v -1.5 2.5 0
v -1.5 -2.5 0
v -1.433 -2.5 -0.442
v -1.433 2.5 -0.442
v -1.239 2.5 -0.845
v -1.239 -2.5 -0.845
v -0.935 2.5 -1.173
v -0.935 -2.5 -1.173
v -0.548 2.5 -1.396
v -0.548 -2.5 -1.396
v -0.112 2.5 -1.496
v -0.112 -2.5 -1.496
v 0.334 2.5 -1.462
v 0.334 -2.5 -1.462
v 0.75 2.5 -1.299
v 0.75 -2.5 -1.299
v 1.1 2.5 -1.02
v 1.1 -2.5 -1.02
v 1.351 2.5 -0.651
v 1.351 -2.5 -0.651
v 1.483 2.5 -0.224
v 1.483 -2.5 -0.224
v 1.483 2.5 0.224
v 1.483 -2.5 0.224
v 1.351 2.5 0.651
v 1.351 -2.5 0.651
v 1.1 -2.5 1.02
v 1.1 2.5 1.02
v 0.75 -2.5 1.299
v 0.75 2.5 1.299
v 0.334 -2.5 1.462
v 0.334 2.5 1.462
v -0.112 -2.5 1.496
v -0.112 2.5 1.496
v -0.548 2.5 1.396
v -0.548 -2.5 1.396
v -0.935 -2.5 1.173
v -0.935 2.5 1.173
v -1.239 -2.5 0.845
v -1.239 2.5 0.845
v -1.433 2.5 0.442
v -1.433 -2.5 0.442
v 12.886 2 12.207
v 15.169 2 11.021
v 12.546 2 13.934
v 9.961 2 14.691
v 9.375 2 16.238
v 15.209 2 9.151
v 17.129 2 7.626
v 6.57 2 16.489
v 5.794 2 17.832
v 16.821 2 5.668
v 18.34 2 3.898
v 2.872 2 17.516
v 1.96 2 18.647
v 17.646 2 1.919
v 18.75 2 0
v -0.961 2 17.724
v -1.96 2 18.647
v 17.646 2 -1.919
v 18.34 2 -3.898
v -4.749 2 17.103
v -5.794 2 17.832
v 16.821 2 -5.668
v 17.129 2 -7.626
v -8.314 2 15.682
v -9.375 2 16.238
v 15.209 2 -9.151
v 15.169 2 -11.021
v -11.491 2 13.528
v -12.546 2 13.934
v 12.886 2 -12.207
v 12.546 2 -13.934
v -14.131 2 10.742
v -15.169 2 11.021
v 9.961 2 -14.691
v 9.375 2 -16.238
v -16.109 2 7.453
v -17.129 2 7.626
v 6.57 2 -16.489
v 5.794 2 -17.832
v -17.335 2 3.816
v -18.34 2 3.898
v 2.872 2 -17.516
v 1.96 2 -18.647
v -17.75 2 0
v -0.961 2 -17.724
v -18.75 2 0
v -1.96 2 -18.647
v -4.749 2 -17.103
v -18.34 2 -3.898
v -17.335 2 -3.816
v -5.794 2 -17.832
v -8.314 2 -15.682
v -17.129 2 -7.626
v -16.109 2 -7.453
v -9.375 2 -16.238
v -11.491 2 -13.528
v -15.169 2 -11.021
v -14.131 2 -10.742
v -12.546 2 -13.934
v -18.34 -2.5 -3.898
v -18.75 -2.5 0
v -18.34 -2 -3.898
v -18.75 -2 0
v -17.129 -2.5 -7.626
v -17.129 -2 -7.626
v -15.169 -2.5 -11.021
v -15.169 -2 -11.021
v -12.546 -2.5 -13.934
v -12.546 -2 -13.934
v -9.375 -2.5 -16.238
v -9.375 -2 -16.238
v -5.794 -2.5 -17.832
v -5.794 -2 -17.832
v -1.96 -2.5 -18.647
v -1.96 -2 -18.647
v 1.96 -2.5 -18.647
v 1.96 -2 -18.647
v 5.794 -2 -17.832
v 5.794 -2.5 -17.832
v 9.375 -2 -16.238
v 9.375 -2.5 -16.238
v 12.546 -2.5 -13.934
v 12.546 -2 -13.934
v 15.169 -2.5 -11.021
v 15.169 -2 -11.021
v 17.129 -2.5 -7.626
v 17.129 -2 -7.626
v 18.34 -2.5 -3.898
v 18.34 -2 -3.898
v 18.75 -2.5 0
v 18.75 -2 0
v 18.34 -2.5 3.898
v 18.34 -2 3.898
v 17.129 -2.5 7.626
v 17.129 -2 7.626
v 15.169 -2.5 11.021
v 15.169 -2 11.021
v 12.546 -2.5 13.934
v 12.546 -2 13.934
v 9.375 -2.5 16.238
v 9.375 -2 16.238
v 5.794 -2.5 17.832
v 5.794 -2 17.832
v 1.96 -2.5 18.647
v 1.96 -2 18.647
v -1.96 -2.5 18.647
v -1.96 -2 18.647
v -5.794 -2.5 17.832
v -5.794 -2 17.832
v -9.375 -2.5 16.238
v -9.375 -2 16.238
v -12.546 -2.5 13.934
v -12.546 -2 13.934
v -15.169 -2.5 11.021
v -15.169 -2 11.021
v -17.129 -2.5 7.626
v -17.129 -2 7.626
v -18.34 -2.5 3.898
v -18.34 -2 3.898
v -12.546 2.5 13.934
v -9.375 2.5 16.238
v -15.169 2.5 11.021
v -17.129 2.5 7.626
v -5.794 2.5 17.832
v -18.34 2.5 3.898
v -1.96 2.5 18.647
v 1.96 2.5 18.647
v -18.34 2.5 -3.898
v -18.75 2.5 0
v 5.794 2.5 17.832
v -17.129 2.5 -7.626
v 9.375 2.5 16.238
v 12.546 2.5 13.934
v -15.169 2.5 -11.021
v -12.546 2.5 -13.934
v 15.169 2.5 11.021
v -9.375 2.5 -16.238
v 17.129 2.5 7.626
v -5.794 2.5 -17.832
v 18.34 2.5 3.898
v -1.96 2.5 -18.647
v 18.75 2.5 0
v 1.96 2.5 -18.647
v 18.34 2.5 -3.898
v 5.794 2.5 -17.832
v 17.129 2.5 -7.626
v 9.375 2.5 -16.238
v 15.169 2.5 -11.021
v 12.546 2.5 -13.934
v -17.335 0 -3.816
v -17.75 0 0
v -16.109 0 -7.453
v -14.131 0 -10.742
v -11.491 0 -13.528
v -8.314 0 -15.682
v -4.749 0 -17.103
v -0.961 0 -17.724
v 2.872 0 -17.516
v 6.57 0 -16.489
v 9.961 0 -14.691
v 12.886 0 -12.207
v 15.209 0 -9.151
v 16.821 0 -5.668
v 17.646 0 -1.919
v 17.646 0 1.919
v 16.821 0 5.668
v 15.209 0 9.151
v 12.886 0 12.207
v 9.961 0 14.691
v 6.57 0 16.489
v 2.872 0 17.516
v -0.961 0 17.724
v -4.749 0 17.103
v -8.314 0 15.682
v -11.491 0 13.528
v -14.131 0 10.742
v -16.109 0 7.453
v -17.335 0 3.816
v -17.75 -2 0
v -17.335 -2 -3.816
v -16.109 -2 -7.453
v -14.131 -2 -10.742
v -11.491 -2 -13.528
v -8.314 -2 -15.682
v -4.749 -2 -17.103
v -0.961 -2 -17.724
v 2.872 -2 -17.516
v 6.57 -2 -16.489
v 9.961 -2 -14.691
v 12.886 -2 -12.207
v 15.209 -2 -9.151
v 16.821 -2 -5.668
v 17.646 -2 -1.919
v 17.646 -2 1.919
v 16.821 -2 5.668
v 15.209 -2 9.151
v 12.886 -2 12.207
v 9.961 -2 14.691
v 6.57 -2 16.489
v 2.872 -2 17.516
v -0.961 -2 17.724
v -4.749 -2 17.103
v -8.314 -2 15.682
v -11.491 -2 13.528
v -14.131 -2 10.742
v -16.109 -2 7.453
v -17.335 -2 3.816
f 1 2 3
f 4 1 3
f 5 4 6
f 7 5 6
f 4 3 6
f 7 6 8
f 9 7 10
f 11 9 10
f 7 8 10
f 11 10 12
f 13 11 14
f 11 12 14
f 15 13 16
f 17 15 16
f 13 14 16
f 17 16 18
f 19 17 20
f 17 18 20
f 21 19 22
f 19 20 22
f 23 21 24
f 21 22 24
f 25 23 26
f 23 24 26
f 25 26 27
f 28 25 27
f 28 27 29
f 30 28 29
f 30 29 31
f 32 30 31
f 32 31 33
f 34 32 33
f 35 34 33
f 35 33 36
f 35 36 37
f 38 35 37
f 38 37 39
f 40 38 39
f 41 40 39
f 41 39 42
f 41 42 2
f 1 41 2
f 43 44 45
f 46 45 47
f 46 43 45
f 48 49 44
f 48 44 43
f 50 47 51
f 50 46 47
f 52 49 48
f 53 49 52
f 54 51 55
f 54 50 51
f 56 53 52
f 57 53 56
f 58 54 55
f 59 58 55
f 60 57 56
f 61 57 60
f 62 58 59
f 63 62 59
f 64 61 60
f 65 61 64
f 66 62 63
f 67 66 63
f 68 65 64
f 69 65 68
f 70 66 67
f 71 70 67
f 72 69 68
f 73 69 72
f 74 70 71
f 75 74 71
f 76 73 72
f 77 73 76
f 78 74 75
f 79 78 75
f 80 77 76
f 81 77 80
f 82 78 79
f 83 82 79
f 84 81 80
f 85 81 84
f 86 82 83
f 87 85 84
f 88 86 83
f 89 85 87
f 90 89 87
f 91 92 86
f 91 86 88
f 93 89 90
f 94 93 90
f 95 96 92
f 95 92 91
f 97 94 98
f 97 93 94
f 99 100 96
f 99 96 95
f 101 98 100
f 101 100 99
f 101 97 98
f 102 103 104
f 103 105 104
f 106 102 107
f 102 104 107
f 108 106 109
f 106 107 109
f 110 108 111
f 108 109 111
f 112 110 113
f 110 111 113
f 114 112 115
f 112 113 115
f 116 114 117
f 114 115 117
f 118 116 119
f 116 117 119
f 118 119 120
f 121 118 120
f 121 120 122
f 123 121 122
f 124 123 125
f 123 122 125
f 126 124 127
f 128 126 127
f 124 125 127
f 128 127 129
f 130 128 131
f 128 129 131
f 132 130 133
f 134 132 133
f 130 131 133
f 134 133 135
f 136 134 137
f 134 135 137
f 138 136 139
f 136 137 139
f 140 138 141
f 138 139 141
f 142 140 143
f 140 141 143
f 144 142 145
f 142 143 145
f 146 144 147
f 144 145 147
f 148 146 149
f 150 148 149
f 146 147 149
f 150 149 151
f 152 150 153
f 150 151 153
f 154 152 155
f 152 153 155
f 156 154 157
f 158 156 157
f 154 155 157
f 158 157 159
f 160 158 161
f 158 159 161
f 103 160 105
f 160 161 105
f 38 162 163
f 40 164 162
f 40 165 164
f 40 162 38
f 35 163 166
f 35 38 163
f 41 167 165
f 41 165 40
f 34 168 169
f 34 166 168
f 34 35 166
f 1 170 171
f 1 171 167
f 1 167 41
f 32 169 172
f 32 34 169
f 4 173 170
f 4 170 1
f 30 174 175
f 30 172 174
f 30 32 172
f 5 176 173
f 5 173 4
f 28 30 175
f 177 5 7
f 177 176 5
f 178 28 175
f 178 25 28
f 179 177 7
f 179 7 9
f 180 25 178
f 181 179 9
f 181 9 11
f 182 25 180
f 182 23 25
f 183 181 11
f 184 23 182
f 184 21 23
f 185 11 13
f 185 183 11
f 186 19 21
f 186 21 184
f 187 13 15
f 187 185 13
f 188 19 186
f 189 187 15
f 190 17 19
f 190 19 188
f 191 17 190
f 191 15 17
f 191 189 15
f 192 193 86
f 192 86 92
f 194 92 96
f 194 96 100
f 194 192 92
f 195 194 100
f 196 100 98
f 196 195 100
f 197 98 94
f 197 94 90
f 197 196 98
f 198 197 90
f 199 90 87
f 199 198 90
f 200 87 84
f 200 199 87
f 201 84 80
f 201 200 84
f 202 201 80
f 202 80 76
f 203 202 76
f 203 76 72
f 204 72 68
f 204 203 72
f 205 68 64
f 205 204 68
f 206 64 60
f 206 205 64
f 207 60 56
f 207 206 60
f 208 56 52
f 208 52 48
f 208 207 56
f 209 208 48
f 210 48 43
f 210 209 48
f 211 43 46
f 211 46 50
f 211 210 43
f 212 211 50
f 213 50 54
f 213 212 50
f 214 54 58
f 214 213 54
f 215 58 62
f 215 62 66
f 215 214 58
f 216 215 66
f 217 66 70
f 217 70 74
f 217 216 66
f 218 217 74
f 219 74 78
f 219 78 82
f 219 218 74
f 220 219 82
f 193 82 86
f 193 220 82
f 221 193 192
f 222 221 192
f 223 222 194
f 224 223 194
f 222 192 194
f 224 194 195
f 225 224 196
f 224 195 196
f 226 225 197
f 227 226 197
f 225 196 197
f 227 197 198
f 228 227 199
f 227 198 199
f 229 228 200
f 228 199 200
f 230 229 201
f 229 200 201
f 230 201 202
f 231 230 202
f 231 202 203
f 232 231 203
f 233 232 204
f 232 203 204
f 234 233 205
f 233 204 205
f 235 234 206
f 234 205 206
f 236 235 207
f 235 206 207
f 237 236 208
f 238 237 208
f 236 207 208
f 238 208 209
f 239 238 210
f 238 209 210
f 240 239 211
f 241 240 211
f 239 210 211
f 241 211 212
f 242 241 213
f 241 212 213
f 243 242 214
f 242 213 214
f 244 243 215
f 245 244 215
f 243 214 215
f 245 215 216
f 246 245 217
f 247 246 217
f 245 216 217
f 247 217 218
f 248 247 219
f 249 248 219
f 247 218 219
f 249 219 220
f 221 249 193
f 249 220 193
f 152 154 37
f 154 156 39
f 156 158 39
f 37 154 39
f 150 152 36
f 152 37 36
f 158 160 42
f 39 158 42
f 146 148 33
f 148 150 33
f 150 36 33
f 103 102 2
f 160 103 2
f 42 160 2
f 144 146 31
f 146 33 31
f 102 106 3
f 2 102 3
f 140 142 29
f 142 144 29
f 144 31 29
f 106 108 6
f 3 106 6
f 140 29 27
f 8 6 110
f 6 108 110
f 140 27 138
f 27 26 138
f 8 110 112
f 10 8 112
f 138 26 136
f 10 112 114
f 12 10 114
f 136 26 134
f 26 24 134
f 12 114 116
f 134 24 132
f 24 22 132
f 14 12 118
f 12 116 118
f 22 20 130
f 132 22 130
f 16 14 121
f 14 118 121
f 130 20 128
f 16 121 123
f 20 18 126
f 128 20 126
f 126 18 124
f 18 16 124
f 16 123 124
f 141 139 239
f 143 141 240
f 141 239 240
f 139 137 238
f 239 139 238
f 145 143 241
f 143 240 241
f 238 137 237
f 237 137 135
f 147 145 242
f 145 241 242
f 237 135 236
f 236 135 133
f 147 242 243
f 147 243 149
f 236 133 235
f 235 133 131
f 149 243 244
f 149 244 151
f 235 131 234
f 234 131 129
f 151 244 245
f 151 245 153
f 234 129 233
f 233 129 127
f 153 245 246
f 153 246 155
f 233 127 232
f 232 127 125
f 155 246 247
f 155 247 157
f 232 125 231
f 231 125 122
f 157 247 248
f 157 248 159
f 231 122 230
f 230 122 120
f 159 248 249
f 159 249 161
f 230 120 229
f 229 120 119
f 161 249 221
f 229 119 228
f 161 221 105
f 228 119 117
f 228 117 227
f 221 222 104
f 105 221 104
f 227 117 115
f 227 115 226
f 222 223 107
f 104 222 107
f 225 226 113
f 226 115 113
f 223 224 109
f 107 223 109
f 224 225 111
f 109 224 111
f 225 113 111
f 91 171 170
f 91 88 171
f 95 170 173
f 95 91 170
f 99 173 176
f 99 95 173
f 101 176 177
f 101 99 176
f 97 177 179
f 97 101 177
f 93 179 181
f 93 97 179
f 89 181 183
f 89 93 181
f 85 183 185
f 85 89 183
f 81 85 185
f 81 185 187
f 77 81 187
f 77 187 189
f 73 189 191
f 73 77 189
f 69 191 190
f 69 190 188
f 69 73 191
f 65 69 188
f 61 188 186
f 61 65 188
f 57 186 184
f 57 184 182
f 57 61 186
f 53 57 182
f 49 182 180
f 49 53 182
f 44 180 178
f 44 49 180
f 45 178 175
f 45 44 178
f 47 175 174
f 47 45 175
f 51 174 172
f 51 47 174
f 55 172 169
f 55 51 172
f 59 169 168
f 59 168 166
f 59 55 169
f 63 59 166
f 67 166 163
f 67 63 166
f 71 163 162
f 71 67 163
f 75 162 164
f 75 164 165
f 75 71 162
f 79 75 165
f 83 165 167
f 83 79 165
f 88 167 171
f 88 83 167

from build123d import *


with BuildPart() as part:
    # Sketch1 → Revolve1 (revolve)
    with BuildSketch(Plane.XY):
        Polygon((-13.146540644, 2.5), (-18.75, 2.5), (-18.75, 2), (-17.75, 2), (-17.75, 0), (-1.5, 0), (-1.5, 2.5), align=None)
    revolve1 = revolve(axis=Axis((0, 14.394370017, 0), (0, -1, 0)))

    # Mirror1: Revolve1 across Top Plane
    add(revolve1.mirror(Plane(origin=(0, 0, 0), x_dir=(1, 0, 0), z_dir=(0, 1, 0))))


solid = part.part
